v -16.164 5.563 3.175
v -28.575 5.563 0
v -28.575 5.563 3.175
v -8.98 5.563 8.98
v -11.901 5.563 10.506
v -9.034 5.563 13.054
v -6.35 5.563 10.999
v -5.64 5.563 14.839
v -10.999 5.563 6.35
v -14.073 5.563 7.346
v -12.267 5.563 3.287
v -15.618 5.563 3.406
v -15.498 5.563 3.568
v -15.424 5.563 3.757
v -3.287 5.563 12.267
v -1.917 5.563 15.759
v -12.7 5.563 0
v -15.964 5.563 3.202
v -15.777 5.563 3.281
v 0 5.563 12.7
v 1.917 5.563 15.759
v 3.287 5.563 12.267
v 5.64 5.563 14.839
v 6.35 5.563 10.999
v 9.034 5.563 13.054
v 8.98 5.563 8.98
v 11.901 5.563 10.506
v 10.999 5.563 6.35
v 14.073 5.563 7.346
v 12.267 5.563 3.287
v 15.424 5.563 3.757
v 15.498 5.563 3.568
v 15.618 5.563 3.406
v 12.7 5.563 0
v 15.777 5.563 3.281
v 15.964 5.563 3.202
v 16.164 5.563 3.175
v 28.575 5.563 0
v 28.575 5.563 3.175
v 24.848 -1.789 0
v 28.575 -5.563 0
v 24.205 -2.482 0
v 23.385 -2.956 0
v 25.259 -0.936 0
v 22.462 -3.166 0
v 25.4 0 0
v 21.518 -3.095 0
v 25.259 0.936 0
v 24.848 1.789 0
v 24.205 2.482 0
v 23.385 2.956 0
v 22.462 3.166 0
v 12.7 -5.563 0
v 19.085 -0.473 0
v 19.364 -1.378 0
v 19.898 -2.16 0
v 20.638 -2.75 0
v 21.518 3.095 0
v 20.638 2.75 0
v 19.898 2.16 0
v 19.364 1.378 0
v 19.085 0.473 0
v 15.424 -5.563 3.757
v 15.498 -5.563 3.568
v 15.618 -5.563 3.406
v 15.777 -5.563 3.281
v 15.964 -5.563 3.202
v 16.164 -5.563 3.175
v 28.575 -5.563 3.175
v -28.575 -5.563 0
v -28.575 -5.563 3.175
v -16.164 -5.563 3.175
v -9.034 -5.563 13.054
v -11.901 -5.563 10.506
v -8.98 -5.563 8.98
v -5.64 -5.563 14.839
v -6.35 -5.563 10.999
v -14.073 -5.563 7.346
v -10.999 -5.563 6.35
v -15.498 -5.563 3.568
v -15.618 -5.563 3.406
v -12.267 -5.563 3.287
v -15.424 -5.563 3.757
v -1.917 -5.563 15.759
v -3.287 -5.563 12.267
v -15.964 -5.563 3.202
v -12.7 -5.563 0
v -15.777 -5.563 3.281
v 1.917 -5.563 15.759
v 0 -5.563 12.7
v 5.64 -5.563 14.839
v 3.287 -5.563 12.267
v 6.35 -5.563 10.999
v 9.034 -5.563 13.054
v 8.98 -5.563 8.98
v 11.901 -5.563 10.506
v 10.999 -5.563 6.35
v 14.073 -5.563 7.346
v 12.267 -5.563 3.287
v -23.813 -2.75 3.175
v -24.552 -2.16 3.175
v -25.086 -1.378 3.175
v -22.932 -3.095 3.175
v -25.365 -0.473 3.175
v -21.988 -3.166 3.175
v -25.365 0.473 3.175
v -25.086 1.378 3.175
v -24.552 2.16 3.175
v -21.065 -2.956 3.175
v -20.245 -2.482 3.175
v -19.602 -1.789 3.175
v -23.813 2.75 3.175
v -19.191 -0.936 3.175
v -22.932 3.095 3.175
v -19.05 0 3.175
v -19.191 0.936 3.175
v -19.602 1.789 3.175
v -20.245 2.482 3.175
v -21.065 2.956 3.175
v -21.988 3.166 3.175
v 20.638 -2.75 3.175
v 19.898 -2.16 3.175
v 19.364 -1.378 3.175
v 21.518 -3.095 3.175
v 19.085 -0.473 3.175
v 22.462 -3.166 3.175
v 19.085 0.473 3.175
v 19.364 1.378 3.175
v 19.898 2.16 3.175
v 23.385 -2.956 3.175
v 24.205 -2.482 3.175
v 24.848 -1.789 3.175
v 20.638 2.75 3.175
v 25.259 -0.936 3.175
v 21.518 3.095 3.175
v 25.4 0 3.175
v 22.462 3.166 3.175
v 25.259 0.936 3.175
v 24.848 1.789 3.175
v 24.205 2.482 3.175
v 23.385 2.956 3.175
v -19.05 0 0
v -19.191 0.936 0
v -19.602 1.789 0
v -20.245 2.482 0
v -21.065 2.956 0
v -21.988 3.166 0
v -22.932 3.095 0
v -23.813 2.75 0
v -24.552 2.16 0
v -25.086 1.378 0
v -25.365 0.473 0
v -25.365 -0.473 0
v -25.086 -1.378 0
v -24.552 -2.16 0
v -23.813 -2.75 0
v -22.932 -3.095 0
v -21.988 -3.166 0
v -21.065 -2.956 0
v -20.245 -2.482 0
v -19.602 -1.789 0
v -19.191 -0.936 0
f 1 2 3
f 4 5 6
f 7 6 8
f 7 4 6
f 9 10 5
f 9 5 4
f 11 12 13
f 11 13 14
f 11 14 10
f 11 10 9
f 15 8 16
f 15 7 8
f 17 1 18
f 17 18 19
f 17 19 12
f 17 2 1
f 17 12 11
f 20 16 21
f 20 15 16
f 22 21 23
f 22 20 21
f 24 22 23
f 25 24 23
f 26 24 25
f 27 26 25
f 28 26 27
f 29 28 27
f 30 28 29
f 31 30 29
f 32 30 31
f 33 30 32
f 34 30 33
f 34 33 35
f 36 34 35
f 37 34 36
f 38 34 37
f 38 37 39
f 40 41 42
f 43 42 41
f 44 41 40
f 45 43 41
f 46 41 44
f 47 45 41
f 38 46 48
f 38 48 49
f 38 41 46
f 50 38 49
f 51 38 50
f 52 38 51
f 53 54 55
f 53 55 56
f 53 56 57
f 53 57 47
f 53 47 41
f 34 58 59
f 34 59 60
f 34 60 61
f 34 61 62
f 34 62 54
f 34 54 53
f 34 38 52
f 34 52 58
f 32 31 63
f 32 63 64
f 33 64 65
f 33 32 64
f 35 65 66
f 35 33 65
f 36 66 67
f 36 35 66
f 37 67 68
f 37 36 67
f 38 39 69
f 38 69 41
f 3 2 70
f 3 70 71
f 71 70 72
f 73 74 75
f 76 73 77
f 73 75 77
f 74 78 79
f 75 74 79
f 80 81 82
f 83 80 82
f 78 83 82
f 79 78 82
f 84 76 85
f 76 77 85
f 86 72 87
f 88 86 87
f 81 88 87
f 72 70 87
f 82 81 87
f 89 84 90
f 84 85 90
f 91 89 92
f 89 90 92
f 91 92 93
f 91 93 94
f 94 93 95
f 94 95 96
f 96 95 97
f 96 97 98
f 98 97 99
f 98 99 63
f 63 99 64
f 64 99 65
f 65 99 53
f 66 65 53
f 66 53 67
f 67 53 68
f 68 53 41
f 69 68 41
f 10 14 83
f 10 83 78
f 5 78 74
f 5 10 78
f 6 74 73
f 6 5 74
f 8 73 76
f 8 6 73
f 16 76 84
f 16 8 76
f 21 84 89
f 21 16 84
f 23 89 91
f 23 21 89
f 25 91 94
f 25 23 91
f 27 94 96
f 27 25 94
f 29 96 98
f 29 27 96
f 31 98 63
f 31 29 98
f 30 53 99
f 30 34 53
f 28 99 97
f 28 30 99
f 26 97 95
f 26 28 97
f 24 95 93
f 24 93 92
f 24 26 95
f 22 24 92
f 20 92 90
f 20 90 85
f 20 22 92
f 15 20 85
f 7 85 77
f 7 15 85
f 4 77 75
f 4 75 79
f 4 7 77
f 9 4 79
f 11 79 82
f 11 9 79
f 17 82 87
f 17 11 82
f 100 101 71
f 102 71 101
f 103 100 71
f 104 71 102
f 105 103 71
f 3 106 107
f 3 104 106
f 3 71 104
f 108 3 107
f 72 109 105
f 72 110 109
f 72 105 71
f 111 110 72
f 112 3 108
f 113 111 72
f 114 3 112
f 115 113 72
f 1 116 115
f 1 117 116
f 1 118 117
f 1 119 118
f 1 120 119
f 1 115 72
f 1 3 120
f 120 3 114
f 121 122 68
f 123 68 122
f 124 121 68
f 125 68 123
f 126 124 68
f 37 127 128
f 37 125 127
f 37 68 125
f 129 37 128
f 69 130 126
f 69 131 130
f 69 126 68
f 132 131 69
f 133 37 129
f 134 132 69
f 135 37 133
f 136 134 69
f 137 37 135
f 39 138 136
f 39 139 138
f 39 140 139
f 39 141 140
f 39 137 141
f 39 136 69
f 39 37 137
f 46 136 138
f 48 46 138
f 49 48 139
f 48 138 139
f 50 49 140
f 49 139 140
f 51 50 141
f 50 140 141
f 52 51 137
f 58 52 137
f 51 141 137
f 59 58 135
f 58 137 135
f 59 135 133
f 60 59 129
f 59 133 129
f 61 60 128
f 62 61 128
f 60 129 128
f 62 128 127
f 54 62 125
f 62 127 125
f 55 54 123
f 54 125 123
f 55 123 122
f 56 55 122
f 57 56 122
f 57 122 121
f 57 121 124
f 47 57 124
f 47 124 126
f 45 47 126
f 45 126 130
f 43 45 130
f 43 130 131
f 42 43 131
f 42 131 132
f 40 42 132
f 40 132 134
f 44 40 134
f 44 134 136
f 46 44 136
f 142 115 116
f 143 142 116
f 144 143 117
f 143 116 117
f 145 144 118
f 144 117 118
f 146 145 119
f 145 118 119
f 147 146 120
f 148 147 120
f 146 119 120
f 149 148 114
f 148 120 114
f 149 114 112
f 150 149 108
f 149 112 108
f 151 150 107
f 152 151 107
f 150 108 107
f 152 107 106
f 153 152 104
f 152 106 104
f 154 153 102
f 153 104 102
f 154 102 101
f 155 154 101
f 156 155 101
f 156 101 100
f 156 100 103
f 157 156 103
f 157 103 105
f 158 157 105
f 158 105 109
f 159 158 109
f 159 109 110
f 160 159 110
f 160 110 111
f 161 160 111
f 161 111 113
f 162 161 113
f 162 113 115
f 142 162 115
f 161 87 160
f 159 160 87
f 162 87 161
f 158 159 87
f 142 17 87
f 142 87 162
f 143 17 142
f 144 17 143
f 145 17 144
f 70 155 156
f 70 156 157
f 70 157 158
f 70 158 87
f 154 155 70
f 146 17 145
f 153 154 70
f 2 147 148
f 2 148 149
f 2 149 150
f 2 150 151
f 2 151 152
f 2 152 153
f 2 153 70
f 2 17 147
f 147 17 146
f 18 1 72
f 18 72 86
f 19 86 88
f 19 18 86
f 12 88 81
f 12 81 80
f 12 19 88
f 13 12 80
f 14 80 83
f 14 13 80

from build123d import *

# Parameters (mm, degrees)
BOSS_EXTRUDE1_DEPTH = 5.5626
SKETCH2_R           = 3.175
CUT_EXTRUDE1_DEPTH  = 32.761031843


with BuildPart() as part:
    # Sketch1 → Boss-Extrude1 (new, symmetric)
    with BuildSketch(Plane(origin=(0, 0, 0), x_dir=(1, 0, 0), z_dir=(0, 1, 0))):
        with BuildLine():
            Line((-12.7, 0), (-28.575, 0))
            Line((-28.575, 0), (-28.575, -3.175))
            Line((-28.575, -3.175), (-16.164461018, -3.175))
            ThreePointArc((-16.164461018, -3.175), (-15.693695846, -3.337813758), (-15.424104025, -3.756679389))
            ThreePointArc((-15.424104025, -3.756679389), (0, -15.875), (15.424104025, -3.756679389))
            ThreePointArc((15.424104025, -3.756679389), (15.693695846, -3.337813758), (16.164461018, -3.175))
            Line((16.164461018, -3.175), (28.575, -3.175))
            Line((28.575, -3.175), (28.575, 0))
            Line((28.575, 0), (12.7, 0))
            ThreePointArc((12.7, 0), (0, -12.7), (-12.7, 0))
        make_face()
    extrude(amount=BOSS_EXTRUDE1_DEPTH, both=True)

    # Sketch2 → Cut-Extrude1 (cut, through all)
    with BuildSketch(Plane.XY.offset(3.175)):
        with Locations((-22.225, 0)):
            Circle(SKETCH2_R)
        with Locations((22.225, 0)):
            Circle(SKETCH2_R)
    extrude(amount=-CUT_EXTRUDE1_DEPTH, mode=Mode.SUBTRACT)


solid = part.part
